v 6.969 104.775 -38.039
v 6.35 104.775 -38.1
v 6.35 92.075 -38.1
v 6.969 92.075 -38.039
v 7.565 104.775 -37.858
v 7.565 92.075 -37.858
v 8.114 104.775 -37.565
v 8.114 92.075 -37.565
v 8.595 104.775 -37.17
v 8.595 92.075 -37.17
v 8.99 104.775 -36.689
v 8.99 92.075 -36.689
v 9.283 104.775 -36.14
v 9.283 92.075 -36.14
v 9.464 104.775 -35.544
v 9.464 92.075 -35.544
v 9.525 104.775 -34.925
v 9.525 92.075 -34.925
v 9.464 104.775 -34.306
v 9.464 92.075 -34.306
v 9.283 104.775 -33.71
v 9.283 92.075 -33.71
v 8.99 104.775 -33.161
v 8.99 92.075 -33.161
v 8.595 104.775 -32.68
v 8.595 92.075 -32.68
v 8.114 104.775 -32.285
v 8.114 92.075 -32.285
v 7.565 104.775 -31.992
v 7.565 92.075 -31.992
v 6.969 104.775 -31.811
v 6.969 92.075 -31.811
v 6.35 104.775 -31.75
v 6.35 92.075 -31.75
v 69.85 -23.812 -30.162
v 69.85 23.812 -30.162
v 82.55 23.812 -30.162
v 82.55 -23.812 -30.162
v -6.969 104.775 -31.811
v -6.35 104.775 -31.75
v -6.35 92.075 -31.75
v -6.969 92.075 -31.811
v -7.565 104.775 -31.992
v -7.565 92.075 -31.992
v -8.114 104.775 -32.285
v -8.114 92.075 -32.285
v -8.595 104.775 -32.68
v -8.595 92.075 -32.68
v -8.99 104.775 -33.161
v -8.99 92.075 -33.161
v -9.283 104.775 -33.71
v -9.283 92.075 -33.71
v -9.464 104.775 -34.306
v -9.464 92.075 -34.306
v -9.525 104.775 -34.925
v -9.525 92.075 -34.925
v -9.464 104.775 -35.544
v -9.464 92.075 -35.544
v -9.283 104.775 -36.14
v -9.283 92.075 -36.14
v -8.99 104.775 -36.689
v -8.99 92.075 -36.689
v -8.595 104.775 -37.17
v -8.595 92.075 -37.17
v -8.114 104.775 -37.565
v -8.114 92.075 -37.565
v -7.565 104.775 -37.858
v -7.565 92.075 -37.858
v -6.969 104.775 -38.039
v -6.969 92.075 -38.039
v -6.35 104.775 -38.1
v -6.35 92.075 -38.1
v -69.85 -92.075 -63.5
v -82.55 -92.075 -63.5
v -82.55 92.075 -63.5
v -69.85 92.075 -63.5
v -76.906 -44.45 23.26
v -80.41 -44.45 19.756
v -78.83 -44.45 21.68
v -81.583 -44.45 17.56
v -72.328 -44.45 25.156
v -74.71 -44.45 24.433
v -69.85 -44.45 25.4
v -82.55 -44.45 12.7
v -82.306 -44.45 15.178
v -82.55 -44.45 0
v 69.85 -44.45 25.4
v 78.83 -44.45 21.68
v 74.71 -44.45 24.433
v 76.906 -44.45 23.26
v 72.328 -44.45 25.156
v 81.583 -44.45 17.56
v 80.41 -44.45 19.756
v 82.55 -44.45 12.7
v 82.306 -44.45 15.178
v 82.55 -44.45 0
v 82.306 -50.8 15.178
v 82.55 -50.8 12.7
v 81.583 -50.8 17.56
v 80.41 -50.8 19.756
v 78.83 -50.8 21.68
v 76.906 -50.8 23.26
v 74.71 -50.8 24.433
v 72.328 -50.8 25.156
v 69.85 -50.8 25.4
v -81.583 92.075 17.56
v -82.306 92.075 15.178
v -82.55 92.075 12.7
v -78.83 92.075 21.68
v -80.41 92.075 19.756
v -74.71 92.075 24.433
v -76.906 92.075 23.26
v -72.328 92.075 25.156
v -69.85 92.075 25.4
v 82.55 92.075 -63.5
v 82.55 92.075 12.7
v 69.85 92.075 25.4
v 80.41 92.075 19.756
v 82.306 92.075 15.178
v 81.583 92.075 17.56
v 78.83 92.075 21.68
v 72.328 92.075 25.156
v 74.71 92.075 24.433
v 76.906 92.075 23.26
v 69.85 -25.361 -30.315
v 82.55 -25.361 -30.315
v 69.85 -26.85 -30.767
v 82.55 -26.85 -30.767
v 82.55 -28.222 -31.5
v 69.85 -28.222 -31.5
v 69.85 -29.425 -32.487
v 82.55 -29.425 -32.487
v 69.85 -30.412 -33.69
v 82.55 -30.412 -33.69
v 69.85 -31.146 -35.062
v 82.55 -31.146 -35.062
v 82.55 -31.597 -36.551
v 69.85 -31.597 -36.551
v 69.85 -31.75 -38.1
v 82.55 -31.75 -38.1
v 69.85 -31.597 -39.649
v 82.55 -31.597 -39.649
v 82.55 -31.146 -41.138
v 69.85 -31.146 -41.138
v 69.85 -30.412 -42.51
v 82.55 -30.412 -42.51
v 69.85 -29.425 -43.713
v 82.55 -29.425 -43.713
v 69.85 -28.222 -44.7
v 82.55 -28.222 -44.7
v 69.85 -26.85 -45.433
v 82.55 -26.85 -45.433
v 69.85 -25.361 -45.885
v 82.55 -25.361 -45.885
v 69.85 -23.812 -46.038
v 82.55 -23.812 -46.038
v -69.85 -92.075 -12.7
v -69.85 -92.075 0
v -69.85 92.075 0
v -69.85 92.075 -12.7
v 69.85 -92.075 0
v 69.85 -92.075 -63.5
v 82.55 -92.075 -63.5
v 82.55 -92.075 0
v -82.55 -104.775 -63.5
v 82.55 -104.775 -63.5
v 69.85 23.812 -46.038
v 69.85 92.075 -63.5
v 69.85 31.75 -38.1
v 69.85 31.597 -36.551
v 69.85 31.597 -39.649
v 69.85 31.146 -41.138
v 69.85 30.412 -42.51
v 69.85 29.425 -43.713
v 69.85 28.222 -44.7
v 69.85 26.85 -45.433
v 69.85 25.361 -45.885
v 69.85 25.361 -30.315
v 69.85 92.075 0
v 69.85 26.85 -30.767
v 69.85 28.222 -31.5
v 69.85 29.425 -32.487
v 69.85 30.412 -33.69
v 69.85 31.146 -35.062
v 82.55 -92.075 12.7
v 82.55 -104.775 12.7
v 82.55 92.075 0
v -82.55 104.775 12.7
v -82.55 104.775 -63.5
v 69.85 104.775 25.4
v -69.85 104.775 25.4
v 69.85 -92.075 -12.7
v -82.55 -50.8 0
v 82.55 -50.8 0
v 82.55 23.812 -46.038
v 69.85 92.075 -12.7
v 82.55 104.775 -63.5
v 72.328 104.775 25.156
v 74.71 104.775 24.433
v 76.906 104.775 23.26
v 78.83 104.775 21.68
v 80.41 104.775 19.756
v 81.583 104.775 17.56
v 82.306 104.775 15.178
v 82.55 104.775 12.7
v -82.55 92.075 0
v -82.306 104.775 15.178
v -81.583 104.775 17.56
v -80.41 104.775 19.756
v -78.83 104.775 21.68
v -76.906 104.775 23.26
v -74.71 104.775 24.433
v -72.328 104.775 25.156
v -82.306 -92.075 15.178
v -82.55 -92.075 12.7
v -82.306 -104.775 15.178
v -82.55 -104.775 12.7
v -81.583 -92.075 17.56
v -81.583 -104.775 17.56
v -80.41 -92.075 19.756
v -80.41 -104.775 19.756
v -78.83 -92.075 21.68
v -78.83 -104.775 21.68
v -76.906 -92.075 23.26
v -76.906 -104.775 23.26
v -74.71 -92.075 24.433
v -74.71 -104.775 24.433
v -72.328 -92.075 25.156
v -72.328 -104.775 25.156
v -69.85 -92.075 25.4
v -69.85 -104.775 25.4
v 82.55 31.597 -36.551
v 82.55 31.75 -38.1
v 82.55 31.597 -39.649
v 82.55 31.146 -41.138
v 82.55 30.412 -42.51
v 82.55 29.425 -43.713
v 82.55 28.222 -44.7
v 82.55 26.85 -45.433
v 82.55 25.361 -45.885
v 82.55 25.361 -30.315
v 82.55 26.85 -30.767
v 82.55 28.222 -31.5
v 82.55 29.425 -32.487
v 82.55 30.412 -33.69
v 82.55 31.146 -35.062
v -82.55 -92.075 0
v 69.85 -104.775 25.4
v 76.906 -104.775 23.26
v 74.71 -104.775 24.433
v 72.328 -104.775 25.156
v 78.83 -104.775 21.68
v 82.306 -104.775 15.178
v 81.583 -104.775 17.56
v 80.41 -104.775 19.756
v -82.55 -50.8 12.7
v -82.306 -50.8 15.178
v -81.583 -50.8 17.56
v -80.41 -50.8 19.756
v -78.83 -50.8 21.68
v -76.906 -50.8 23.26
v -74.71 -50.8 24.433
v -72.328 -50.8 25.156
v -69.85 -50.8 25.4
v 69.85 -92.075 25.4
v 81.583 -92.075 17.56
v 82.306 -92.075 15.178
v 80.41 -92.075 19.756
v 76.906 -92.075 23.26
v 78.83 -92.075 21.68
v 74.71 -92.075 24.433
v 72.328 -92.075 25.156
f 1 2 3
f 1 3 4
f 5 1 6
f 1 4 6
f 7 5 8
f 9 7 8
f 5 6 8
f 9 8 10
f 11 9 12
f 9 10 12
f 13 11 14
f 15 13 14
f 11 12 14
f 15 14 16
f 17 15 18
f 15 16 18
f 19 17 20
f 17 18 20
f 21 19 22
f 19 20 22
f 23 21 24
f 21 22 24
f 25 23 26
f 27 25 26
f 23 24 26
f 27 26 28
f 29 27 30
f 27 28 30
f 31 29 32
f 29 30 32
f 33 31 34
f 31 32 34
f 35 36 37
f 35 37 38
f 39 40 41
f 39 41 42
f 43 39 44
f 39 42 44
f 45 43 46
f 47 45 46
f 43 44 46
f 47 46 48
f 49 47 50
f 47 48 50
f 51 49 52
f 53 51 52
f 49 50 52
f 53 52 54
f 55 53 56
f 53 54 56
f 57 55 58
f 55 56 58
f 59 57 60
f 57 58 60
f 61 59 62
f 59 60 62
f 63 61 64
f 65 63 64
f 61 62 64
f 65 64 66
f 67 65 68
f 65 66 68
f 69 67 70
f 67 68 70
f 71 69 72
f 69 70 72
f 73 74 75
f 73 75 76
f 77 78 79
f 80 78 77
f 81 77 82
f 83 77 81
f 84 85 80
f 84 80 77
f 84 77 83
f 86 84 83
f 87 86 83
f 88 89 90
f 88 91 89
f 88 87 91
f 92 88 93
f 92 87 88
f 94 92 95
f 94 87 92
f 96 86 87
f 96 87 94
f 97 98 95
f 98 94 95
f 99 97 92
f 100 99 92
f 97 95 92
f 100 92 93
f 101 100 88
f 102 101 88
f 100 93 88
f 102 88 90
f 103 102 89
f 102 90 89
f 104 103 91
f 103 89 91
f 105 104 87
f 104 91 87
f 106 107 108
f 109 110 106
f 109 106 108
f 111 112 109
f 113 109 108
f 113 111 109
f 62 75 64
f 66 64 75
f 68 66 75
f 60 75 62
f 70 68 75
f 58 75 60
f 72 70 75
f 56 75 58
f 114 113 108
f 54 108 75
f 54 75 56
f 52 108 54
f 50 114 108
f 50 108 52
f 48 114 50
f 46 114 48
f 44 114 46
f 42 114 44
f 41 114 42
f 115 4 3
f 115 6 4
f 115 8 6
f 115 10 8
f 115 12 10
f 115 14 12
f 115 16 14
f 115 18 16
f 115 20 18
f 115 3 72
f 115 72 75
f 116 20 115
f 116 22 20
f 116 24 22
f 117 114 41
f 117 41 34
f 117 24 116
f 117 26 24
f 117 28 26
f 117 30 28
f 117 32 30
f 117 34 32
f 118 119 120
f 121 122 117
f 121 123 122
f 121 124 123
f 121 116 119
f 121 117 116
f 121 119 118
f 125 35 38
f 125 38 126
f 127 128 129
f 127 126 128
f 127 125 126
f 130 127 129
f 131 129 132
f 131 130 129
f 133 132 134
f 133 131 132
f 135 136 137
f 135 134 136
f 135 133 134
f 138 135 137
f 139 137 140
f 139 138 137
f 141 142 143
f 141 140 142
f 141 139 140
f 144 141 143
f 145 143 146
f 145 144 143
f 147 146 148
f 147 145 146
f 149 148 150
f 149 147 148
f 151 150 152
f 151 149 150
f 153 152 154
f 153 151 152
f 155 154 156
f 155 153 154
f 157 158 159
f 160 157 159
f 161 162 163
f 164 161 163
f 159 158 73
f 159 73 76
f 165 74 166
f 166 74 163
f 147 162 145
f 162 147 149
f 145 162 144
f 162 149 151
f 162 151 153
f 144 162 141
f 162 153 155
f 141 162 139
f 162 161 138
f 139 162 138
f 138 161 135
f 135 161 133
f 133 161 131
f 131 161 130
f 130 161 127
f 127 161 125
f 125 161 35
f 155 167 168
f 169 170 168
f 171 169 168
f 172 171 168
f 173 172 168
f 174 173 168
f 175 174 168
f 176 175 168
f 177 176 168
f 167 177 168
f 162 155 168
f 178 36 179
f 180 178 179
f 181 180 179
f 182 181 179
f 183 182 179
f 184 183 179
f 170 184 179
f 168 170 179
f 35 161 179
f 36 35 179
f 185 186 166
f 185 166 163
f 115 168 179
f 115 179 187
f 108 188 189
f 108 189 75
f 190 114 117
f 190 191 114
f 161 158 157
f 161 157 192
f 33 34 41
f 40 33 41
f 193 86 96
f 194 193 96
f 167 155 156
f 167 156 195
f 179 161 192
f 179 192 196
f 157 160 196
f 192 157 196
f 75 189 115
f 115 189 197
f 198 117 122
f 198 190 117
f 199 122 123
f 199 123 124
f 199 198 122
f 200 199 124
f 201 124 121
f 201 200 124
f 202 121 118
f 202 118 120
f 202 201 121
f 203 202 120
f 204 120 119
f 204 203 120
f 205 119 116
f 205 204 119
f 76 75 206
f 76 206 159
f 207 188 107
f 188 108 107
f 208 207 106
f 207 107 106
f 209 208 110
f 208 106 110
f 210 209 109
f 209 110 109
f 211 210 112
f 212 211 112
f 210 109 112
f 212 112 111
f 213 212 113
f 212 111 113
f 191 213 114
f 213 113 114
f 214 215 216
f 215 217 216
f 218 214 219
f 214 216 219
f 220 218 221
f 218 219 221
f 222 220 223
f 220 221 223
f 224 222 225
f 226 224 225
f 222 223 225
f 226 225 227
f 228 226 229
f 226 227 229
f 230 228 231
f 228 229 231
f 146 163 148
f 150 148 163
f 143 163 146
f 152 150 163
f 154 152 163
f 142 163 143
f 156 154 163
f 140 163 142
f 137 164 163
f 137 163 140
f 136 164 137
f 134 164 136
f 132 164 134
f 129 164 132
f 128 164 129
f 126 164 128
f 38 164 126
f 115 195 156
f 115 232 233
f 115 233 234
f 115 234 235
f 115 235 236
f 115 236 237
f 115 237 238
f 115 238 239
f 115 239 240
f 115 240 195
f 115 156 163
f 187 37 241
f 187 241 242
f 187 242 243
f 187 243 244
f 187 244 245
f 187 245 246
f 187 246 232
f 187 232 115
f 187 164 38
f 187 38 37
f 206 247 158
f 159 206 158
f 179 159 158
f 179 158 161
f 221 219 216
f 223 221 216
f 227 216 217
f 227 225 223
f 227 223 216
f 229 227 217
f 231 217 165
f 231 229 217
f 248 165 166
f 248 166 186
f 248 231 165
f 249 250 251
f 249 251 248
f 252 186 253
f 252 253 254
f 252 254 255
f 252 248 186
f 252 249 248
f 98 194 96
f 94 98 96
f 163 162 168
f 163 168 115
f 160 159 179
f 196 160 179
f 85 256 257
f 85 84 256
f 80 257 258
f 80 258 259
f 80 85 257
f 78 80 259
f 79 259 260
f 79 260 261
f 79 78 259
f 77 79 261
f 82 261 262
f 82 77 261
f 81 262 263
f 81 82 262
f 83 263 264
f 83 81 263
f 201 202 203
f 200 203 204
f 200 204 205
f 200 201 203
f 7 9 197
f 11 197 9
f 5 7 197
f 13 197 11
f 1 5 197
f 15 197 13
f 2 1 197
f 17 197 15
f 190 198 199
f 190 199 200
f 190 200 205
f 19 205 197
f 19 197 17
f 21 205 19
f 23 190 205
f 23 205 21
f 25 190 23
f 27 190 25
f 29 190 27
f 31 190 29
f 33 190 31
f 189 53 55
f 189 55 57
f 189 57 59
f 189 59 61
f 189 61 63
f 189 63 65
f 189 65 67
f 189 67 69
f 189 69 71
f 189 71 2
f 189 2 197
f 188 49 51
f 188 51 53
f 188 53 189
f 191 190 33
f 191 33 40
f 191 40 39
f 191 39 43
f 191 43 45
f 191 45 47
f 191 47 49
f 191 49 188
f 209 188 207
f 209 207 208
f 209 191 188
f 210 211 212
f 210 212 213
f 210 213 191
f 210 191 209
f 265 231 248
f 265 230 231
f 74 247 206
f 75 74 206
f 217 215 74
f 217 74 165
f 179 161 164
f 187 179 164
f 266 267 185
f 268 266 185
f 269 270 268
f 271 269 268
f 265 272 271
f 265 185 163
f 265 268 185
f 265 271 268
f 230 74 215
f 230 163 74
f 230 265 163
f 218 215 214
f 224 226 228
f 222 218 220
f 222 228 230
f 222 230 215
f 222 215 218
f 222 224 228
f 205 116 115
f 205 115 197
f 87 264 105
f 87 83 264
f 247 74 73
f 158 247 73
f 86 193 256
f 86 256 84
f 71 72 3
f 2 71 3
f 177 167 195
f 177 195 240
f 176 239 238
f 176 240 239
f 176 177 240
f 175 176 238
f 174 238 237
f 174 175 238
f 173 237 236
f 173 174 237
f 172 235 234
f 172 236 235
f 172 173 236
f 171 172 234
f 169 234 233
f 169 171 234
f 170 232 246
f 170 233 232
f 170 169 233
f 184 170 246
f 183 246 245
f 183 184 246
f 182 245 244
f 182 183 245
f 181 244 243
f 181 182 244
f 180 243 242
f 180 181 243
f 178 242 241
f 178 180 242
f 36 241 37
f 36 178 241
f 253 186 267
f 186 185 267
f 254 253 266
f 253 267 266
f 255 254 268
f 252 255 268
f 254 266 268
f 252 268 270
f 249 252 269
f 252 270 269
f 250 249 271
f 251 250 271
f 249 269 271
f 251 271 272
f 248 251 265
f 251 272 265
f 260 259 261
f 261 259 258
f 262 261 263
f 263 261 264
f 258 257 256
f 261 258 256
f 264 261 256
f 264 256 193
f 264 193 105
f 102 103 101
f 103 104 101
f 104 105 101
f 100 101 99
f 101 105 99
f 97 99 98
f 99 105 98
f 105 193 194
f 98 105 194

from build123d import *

# Parameters (mm, degrees)
F0_W          = 12.7
F0_H          = 184.15
F1_DEPTH      = 63.5
F2_DEPTH      = 25.4
F2_DEPTH_BACK = 63.5
F3_W          = 139.7
F3_H          = 184.15
F4_DEPTH      = 12.7
F6_DEPTH      = 82.551
F7_W          = 165.1
F7_H          = 6.35
F8_DEPTH      = 25.4
F9_R          = 12.7
F9_2_R        = 12.7
F11_DEPTH     = 104.776


with BuildPart() as f1:
    # F0 (on Top) → F1 (new body)
    with BuildSketch(Plane.XY):
        with Locations((76.2, 0)):
            Rectangle(F0_W, F0_H)
        with Locations((-76.2, 0)):
            Rectangle(F0_W, F0_H)
    extrude(amount=-F1_DEPTH)

    # F5 (on Right) → F6 (cut, through all)
    with BuildSketch(Plane.YZ):
        with BuildLine():
            ThreePointArc((-23.8125, -30.1625), (-31.75, -38.1), (-23.8125, -46.0375))
            Line((-23.8125, -46.0375), (23.8125, -46.0375))
            ThreePointArc((23.8125, -46.0375), (31.75, -38.1), (23.8125, -30.1625))
            Line((23.8125, -30.1625), (-23.8125, -30.1625))
        make_face()
    extrude(amount=F6_DEPTH, mode=Mode.SUBTRACT)


with BuildPart() as f2:
    # F0 (on Top) → F2 (new body, two sides)
    with BuildSketch(Plane.XY) as f2_sk:
        Polygon((69.85, -92.075), (-69.85, -92.075), (-82.55, -92.075), (-82.55, -104.775), (82.55, -104.775), (82.55, -92.075), align=None)
        Polygon((-82.55, 92.075), (-69.85, 92.075), (69.85, 92.075), (82.55, 92.075), (82.55, 104.775), (-82.55, 104.775), align=None)
    extrude(amount=F2_DEPTH)
    extrude(f2_sk.sketch, amount=-F2_DEPTH_BACK)

    # F9
    f9_edges = [f2.edges().sort_by_distance(p)[0] for p in [
        (-82.55, 98.425, 25.4),
        (82.55, 98.425, 25.4),
        (-82.55, -98.425, 25.4),
        (82.55, -98.425, 25.4),
    ]]
    fillet(f9_edges, radius=F9_R)

    # F10 (on Front) → F11 (cut, through all)
    with BuildSketch(Plane.XZ):
        with BuildLine():
            ThreePointArc((-6.35, -31.75), (-9.525, -34.925), (-6.35, -38.1))
            Line((-6.35, -38.1), (6.35, -38.1))
            ThreePointArc((6.35, -38.1), (9.525, -34.925), (6.35, -31.75))
            Line((6.35, -31.75), (-6.35, -31.75))
        make_face()
    extrude(amount=-F11_DEPTH, mode=Mode.SUBTRACT)


with BuildPart() as f4:
    # F3 (on Top) → F4 (new body)
    with BuildSketch(Plane.XY):
        Rectangle(F3_W, F3_H)
    extrude(amount=-F4_DEPTH)


with BuildPart() as f8:
    # F7 (on Top) → F8 (new body)
    with BuildSketch(Plane.XY):
        with Locations((0, -47.625)):
            Rectangle(F7_W, F7_H)
    extrude(amount=F8_DEPTH)

    # F9#2
    f9_2_edges = [f8.edges().sort_by_distance(p)[0] for p in [
        (82.55, -47.625, 25.4),
        (-82.55, -47.625, 25.4),
    ]]
    fillet(f9_2_edges, radius=F9_2_R)


solid = Compound([f1.part, f2.part, f4.part, f8.part])
